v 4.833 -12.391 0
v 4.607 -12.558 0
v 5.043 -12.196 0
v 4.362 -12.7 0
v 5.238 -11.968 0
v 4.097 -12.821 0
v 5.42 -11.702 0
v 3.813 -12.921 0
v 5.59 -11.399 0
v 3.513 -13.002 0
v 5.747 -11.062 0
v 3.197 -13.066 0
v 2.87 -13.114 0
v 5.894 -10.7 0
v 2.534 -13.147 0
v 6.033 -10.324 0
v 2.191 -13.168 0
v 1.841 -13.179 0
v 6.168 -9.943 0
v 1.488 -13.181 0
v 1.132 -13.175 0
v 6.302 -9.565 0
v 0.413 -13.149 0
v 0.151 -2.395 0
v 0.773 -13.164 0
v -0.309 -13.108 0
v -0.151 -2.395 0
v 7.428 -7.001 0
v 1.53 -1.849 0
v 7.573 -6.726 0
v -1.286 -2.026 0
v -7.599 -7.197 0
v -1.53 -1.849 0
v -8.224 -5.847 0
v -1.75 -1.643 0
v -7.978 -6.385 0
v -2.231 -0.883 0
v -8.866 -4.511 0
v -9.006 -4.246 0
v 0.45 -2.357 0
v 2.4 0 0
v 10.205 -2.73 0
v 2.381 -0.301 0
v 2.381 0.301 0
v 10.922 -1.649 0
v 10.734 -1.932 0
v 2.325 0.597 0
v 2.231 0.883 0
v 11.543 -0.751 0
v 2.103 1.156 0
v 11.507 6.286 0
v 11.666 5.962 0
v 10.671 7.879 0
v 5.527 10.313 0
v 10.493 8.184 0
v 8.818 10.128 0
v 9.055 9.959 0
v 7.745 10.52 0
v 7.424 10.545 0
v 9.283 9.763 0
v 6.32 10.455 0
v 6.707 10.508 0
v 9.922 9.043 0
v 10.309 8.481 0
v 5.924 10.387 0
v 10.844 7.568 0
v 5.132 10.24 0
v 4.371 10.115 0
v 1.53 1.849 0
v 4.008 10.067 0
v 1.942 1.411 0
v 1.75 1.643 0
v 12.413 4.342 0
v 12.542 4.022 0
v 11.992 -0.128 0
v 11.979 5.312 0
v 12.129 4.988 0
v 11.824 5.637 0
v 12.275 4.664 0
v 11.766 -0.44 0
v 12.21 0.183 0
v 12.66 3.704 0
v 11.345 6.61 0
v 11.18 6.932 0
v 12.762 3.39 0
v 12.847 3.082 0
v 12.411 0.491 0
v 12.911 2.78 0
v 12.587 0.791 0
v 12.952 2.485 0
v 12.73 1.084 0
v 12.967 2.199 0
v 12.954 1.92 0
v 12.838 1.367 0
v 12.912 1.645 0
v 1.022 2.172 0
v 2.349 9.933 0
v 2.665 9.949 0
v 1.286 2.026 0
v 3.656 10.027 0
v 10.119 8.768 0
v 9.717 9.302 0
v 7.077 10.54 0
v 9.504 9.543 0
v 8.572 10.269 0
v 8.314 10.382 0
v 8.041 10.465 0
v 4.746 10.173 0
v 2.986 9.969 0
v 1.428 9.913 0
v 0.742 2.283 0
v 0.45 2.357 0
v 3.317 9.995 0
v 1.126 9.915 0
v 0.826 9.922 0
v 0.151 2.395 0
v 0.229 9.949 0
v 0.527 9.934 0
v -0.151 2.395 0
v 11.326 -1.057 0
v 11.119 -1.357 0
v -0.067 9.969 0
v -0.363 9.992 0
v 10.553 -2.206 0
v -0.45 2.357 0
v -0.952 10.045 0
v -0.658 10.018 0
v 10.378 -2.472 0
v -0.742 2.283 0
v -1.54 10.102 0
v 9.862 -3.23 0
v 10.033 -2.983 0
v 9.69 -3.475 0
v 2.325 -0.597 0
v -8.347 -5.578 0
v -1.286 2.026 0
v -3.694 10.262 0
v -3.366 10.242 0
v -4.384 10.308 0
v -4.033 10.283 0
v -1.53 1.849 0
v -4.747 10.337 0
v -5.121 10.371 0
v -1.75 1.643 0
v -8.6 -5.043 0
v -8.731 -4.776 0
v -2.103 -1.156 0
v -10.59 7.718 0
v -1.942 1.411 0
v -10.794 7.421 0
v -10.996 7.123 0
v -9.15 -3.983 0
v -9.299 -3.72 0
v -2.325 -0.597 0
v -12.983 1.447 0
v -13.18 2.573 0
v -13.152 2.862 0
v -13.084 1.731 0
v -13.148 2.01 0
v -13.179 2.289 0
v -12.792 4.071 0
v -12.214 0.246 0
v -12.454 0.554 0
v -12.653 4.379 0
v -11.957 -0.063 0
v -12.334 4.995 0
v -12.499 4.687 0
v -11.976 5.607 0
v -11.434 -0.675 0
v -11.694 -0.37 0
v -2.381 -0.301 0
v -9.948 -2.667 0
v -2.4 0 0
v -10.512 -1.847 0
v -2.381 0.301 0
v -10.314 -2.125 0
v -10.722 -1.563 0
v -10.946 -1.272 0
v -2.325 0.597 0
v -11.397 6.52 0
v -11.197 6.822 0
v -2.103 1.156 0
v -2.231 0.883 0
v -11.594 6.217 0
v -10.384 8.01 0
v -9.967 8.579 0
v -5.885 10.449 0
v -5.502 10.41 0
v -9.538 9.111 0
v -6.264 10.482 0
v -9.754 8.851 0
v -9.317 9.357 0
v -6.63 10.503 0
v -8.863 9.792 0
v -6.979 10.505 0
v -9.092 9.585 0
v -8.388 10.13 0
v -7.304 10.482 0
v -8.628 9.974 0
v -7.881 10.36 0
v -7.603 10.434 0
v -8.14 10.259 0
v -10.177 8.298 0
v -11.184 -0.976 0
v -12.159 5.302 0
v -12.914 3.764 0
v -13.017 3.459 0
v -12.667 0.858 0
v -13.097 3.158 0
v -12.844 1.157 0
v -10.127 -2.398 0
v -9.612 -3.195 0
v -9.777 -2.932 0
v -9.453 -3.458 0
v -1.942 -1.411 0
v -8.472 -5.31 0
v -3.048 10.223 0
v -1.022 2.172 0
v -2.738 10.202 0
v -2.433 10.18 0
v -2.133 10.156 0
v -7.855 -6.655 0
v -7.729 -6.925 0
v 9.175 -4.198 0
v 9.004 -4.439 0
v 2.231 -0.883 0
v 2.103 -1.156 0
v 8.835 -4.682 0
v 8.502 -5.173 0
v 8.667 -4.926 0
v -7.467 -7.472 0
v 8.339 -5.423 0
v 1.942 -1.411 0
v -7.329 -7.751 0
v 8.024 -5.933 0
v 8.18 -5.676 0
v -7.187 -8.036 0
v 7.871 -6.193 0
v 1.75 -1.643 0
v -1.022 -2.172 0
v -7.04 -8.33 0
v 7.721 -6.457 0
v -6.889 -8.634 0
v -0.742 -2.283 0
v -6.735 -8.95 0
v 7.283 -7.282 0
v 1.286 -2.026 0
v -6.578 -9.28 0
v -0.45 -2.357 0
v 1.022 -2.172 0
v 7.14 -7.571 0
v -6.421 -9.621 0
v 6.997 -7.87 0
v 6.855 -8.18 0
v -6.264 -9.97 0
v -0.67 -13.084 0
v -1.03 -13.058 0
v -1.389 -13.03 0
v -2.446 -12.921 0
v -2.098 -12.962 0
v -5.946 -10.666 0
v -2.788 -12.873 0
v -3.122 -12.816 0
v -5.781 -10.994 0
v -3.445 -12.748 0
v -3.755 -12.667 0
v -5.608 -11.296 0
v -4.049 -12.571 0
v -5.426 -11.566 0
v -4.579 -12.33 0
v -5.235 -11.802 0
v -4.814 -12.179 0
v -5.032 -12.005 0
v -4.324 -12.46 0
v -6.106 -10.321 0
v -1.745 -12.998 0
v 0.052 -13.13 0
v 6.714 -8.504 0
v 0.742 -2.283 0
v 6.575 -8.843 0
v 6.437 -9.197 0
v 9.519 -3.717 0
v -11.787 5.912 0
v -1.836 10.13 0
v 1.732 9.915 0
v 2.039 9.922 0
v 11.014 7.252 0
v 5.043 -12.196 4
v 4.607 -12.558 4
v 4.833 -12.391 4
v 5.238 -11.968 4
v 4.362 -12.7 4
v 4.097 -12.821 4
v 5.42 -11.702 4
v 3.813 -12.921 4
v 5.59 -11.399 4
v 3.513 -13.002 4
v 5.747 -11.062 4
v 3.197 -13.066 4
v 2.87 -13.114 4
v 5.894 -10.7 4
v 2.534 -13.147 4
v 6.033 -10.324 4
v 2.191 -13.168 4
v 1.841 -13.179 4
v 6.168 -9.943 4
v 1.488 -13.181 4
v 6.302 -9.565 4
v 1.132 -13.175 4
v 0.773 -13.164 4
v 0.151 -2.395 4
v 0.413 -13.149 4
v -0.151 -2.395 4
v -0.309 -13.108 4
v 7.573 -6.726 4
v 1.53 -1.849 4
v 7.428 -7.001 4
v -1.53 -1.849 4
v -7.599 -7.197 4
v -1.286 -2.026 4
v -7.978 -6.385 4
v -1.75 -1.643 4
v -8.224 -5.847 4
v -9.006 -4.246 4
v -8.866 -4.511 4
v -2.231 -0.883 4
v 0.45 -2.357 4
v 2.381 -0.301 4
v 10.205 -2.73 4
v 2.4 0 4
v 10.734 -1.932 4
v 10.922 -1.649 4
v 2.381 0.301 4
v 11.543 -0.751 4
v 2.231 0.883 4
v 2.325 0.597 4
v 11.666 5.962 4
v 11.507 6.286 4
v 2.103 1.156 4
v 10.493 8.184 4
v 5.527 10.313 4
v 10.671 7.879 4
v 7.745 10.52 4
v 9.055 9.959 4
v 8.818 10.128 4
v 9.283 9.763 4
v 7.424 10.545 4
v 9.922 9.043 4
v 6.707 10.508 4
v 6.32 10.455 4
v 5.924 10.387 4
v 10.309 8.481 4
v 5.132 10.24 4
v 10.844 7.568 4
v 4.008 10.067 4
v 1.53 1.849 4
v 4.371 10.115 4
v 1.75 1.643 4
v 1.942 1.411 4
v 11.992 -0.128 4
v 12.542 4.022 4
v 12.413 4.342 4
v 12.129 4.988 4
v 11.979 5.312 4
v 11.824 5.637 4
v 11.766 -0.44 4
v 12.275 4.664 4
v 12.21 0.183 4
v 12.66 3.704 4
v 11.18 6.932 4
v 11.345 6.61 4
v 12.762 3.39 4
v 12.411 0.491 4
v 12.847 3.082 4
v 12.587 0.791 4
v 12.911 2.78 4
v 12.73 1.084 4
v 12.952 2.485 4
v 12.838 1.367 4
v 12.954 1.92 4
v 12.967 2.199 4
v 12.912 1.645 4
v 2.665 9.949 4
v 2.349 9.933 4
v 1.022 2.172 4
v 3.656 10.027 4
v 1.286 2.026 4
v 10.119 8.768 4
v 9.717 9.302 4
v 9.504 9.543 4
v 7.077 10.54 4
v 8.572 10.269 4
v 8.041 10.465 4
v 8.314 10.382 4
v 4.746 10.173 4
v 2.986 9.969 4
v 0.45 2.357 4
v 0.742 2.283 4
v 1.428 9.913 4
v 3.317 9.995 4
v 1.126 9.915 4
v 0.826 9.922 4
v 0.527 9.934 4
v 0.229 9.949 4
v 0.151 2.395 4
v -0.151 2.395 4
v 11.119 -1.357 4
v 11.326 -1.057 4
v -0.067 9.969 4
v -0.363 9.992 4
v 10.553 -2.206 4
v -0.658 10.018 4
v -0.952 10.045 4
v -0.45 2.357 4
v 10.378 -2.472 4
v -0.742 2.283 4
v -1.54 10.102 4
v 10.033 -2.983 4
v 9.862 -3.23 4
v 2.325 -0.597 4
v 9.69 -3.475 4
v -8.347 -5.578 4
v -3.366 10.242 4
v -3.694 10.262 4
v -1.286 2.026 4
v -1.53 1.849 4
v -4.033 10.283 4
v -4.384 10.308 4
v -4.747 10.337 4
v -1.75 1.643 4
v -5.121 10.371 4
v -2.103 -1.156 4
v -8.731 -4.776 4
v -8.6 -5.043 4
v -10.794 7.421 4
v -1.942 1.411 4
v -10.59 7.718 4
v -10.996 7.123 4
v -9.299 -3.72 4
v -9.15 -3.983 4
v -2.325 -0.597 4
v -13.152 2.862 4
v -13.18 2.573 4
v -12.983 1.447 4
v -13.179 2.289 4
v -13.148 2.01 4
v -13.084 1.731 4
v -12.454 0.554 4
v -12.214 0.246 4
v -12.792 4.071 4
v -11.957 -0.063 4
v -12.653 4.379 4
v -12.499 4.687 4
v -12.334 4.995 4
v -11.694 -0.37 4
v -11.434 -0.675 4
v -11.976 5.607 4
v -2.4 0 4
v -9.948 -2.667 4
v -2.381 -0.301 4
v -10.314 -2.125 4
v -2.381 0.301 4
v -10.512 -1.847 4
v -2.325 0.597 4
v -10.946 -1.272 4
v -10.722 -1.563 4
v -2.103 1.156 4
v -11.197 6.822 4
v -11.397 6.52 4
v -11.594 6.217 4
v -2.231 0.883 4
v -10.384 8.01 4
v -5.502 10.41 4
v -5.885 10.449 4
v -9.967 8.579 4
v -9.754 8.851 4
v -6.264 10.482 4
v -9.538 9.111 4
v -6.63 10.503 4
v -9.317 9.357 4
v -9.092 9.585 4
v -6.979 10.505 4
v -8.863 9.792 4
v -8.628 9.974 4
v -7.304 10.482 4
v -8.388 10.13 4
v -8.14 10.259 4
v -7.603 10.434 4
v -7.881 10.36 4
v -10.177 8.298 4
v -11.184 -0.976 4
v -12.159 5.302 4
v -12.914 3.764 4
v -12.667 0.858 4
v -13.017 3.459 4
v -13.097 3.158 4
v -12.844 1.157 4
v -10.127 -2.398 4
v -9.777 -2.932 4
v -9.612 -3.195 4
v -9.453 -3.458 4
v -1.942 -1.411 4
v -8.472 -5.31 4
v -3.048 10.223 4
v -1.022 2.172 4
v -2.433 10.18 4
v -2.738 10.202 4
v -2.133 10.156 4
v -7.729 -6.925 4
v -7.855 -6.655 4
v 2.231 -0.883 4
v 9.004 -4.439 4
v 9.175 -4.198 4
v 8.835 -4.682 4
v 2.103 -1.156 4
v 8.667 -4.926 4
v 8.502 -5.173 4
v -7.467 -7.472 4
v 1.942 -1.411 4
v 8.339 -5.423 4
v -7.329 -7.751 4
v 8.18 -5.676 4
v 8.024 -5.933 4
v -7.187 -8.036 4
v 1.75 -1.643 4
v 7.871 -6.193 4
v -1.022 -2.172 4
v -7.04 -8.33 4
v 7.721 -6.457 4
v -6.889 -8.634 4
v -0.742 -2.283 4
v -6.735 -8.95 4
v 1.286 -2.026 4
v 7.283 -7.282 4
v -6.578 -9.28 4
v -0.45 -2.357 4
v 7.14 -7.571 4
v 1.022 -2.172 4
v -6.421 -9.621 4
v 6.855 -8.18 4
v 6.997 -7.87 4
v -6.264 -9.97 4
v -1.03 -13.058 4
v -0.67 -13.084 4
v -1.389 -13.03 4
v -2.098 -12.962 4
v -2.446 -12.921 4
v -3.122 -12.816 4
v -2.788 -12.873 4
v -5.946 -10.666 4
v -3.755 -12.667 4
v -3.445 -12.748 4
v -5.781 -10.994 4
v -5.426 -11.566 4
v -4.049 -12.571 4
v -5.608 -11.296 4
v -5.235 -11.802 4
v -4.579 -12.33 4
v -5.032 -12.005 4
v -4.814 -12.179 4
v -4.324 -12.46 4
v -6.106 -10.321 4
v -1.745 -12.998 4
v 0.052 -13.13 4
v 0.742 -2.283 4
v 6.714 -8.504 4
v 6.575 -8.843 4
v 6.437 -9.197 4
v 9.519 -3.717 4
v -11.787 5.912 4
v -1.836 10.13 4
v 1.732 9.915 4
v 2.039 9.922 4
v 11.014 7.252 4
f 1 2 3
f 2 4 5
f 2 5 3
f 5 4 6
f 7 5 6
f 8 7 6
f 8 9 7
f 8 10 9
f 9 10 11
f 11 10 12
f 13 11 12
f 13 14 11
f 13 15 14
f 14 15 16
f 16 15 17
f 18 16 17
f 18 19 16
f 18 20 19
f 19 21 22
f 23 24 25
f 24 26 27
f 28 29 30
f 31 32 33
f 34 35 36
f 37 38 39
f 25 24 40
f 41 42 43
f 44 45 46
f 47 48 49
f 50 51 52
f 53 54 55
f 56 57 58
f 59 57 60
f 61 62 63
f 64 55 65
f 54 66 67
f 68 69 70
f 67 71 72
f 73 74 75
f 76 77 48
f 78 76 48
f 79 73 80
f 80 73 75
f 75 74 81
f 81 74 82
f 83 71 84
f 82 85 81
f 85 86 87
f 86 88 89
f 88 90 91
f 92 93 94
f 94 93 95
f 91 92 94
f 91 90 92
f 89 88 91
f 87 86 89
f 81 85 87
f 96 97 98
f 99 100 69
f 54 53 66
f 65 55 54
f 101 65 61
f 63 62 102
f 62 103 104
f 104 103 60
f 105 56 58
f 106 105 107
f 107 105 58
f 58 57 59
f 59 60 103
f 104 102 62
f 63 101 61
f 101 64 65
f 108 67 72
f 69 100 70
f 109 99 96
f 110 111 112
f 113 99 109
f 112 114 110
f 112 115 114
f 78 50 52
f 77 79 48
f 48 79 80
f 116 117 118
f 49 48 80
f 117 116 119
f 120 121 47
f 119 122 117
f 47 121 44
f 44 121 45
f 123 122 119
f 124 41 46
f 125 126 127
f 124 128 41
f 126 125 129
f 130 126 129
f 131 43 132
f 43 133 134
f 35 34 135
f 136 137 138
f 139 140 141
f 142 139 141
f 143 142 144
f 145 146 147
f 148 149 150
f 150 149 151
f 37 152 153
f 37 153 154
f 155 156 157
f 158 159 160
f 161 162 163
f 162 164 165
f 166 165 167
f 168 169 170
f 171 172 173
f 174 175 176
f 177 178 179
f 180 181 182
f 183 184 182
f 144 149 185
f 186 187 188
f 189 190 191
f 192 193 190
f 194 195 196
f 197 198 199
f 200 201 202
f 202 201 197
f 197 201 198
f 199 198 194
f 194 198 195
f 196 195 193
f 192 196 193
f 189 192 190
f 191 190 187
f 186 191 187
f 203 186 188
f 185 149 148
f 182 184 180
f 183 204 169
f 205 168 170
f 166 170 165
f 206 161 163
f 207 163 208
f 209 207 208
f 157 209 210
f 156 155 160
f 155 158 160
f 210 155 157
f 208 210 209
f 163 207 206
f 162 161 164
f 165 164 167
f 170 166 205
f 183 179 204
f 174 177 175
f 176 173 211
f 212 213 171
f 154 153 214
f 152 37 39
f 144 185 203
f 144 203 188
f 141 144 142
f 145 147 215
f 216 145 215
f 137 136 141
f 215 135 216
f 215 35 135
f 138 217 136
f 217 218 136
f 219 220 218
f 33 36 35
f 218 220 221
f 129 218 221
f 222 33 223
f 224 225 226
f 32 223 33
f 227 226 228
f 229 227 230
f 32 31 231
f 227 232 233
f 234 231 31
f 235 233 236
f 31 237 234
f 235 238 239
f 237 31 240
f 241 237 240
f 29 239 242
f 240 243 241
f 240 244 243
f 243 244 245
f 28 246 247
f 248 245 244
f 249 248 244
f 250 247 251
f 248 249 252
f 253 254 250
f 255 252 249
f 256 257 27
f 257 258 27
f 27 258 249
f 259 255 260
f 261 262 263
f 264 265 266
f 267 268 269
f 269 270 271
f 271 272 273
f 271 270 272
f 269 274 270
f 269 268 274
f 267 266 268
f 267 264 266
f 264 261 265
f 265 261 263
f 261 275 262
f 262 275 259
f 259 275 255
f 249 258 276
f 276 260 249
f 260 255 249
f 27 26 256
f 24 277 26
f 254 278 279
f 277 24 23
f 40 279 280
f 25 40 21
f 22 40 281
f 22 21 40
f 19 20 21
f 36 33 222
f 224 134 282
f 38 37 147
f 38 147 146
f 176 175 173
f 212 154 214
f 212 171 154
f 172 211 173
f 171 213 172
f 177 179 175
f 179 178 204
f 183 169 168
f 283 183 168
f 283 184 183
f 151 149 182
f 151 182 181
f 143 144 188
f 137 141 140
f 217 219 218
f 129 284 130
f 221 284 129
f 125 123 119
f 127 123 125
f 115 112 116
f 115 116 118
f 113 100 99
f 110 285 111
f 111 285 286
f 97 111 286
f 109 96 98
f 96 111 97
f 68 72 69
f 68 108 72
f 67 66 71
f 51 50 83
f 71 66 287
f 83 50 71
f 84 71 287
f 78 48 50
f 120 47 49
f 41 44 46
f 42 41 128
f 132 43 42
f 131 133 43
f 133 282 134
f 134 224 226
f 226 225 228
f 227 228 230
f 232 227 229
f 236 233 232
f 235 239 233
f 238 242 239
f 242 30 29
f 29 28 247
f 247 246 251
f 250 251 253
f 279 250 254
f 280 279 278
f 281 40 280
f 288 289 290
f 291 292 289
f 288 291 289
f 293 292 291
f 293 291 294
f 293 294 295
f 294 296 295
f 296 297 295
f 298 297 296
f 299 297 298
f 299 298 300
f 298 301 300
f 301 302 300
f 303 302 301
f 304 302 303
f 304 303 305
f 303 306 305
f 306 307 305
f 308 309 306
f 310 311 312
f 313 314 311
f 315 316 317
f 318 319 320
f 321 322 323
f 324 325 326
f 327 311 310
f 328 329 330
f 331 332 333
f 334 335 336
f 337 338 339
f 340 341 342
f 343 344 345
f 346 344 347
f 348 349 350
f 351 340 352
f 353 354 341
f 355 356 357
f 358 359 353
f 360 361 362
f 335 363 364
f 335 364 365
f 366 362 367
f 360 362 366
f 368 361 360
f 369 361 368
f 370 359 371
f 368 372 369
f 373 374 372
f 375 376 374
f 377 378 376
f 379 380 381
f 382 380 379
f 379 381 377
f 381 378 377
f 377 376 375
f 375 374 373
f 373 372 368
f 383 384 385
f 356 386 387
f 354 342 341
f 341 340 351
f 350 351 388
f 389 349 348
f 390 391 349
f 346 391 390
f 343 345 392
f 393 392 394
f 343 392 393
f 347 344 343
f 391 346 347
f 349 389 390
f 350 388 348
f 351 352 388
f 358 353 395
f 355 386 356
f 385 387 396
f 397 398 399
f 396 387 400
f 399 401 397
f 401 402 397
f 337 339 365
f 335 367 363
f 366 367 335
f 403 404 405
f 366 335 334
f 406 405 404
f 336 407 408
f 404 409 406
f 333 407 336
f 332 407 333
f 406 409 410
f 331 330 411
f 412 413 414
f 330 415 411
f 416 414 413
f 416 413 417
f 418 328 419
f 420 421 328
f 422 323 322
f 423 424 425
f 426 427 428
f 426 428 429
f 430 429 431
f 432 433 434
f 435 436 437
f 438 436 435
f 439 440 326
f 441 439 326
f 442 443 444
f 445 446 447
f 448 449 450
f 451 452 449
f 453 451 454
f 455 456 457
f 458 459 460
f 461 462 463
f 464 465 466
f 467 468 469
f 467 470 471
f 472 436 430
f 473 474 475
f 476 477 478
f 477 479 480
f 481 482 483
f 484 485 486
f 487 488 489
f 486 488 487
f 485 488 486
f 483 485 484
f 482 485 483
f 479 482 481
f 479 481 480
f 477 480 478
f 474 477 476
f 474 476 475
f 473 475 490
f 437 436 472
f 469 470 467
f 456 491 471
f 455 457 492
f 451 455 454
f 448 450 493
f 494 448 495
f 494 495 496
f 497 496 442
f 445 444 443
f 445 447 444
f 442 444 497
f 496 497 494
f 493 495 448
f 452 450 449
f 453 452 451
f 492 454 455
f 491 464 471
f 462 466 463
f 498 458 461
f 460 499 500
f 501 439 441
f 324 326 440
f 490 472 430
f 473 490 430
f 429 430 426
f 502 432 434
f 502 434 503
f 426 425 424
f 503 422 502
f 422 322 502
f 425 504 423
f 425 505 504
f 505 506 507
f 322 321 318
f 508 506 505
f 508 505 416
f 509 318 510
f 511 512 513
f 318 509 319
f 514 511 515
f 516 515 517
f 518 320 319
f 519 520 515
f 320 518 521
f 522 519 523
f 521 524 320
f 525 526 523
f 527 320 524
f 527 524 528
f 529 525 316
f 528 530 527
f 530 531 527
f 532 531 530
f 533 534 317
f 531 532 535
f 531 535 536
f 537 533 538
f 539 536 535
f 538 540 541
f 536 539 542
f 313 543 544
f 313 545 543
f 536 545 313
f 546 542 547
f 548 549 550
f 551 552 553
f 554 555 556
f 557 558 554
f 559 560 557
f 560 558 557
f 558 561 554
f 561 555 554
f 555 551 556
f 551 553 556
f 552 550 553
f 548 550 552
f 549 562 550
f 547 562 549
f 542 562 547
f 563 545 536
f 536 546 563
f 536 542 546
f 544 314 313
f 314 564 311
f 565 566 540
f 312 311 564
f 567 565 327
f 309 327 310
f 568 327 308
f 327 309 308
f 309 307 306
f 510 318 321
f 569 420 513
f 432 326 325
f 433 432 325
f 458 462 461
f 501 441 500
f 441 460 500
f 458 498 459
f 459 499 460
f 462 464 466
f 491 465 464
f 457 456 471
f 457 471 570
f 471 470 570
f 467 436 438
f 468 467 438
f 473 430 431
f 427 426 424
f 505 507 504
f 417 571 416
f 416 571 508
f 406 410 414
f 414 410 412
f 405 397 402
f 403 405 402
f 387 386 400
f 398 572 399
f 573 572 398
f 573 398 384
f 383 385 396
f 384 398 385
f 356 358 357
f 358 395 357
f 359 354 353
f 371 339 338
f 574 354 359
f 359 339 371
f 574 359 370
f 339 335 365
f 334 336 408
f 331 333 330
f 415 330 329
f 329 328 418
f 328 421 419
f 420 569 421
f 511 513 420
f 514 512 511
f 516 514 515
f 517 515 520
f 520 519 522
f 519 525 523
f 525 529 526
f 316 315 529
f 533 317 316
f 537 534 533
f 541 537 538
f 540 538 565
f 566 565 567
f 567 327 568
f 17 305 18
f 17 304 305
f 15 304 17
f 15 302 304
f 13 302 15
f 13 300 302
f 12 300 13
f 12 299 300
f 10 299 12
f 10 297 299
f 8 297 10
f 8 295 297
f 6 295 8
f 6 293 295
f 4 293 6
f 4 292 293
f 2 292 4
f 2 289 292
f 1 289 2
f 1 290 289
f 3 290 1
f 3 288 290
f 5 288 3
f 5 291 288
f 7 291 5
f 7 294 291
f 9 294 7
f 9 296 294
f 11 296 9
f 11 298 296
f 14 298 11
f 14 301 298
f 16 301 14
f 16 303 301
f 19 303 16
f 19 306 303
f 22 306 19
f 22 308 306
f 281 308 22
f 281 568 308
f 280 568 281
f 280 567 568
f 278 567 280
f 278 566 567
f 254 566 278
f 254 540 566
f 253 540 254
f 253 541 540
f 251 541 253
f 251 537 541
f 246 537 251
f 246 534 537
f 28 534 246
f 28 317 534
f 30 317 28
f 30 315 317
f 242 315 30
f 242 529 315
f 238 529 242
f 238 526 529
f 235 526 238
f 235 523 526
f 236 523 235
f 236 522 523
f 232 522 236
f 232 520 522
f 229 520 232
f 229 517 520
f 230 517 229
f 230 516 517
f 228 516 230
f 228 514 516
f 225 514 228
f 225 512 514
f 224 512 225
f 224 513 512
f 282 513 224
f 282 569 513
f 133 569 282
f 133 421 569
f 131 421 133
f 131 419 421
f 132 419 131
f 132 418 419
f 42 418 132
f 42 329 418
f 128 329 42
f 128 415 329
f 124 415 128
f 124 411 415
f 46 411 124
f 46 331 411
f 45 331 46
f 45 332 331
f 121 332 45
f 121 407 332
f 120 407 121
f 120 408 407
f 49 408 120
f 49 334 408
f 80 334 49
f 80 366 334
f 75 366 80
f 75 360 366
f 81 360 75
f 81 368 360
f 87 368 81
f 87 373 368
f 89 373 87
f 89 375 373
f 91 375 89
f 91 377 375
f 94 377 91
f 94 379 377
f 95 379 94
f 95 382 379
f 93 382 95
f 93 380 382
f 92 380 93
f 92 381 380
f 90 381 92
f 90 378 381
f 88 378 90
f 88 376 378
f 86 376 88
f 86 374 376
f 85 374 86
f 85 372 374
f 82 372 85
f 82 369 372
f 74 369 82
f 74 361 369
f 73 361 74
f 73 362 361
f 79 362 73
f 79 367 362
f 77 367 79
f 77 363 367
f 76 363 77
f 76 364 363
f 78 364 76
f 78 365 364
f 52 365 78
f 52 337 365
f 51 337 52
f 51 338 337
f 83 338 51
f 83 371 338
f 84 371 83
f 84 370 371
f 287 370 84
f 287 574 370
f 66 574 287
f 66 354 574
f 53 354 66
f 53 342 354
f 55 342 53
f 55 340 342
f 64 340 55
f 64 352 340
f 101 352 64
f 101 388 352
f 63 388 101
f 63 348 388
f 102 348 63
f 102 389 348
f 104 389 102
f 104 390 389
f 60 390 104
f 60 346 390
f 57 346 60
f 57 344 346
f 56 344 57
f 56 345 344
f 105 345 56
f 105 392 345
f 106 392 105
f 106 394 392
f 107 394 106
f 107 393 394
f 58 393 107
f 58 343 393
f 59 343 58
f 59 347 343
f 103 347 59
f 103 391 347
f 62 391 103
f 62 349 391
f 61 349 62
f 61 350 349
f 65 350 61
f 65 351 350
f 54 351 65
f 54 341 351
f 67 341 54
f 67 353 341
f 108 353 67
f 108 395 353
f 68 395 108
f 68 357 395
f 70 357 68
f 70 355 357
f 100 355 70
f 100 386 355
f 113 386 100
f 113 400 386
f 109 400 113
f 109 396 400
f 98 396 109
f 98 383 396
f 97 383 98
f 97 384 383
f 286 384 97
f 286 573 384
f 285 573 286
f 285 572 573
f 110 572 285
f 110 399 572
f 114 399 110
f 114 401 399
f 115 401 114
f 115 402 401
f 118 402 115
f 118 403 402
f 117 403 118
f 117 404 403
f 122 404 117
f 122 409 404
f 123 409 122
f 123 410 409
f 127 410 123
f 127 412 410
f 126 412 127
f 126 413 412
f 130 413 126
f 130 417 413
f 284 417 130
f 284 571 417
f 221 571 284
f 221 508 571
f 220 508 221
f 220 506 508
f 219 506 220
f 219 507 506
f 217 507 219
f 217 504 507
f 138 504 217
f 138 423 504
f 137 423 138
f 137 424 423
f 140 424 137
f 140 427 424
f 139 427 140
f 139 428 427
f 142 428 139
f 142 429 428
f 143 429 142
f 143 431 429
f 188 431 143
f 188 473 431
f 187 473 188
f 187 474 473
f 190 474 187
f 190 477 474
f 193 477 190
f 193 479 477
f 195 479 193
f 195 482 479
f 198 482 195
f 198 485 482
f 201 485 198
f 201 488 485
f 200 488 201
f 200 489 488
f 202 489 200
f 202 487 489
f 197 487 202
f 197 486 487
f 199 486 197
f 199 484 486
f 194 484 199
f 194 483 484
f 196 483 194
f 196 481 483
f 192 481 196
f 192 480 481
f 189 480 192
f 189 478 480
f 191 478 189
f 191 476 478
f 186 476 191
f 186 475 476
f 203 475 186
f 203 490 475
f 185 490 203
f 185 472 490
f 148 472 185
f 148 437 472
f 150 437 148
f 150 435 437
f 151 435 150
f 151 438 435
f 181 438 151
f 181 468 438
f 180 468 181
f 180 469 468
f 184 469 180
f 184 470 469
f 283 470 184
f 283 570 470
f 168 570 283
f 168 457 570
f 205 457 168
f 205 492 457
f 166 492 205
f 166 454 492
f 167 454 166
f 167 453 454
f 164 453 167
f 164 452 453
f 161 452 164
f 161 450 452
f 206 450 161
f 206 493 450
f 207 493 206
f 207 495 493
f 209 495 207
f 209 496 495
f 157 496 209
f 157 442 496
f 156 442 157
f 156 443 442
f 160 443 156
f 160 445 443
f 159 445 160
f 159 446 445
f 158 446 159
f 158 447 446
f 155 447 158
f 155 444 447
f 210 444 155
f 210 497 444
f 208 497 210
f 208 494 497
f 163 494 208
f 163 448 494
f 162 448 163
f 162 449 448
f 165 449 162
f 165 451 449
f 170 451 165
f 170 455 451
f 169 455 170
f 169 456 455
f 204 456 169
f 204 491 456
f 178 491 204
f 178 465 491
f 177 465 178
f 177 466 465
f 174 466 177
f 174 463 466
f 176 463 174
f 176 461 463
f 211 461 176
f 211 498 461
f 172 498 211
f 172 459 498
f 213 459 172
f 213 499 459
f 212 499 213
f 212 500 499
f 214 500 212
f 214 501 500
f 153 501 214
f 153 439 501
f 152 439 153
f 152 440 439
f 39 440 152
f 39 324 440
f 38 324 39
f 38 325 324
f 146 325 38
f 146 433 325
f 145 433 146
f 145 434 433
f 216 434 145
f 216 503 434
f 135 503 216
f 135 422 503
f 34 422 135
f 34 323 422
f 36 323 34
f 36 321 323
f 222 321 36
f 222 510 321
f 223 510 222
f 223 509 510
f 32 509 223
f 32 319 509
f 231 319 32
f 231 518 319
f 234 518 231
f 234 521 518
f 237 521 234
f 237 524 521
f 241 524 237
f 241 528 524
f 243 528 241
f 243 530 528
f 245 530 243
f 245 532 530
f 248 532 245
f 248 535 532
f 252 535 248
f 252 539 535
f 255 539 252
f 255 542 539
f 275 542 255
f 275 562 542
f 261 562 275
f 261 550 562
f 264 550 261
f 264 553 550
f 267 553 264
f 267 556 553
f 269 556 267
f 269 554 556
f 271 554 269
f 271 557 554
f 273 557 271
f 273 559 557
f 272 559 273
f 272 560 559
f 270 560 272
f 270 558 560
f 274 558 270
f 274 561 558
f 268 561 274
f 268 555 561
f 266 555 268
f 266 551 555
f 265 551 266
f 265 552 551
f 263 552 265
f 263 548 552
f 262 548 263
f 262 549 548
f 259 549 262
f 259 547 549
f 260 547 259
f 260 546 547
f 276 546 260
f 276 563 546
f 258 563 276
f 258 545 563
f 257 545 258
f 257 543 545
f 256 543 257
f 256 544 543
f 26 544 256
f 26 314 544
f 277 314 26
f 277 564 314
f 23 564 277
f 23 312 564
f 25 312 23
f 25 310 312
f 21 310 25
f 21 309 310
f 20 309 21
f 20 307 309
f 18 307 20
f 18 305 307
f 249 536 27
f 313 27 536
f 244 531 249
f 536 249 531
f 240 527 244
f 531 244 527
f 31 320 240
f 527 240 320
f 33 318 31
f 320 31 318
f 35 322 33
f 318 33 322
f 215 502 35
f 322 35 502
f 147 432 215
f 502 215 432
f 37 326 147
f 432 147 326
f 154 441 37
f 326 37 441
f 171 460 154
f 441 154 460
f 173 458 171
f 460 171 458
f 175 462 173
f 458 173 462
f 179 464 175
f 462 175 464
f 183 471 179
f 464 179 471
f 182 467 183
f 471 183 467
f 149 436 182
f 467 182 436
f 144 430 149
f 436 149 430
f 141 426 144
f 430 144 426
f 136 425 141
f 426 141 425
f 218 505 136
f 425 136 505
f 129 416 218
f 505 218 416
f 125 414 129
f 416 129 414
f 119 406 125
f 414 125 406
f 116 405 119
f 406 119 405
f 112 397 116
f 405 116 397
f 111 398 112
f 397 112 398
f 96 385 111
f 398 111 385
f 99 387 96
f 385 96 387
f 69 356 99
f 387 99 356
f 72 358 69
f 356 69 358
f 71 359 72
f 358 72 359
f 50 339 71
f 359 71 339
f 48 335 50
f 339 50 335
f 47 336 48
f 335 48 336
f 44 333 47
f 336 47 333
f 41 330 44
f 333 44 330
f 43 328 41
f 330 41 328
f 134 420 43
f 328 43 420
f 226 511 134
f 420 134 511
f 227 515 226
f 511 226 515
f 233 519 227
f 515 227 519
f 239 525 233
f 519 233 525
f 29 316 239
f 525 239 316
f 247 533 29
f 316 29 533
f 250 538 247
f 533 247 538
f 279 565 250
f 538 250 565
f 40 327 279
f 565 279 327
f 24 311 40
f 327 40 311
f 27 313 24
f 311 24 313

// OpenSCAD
/** @function curve_gear_tanh_triad_body_example
 * @brief Tanh Triad body example.
 */
include <../../../src/tanh_triad/gear.scad>
curve_gear_tanh_triad_body(.8,34,4,4.8,samples=240);
